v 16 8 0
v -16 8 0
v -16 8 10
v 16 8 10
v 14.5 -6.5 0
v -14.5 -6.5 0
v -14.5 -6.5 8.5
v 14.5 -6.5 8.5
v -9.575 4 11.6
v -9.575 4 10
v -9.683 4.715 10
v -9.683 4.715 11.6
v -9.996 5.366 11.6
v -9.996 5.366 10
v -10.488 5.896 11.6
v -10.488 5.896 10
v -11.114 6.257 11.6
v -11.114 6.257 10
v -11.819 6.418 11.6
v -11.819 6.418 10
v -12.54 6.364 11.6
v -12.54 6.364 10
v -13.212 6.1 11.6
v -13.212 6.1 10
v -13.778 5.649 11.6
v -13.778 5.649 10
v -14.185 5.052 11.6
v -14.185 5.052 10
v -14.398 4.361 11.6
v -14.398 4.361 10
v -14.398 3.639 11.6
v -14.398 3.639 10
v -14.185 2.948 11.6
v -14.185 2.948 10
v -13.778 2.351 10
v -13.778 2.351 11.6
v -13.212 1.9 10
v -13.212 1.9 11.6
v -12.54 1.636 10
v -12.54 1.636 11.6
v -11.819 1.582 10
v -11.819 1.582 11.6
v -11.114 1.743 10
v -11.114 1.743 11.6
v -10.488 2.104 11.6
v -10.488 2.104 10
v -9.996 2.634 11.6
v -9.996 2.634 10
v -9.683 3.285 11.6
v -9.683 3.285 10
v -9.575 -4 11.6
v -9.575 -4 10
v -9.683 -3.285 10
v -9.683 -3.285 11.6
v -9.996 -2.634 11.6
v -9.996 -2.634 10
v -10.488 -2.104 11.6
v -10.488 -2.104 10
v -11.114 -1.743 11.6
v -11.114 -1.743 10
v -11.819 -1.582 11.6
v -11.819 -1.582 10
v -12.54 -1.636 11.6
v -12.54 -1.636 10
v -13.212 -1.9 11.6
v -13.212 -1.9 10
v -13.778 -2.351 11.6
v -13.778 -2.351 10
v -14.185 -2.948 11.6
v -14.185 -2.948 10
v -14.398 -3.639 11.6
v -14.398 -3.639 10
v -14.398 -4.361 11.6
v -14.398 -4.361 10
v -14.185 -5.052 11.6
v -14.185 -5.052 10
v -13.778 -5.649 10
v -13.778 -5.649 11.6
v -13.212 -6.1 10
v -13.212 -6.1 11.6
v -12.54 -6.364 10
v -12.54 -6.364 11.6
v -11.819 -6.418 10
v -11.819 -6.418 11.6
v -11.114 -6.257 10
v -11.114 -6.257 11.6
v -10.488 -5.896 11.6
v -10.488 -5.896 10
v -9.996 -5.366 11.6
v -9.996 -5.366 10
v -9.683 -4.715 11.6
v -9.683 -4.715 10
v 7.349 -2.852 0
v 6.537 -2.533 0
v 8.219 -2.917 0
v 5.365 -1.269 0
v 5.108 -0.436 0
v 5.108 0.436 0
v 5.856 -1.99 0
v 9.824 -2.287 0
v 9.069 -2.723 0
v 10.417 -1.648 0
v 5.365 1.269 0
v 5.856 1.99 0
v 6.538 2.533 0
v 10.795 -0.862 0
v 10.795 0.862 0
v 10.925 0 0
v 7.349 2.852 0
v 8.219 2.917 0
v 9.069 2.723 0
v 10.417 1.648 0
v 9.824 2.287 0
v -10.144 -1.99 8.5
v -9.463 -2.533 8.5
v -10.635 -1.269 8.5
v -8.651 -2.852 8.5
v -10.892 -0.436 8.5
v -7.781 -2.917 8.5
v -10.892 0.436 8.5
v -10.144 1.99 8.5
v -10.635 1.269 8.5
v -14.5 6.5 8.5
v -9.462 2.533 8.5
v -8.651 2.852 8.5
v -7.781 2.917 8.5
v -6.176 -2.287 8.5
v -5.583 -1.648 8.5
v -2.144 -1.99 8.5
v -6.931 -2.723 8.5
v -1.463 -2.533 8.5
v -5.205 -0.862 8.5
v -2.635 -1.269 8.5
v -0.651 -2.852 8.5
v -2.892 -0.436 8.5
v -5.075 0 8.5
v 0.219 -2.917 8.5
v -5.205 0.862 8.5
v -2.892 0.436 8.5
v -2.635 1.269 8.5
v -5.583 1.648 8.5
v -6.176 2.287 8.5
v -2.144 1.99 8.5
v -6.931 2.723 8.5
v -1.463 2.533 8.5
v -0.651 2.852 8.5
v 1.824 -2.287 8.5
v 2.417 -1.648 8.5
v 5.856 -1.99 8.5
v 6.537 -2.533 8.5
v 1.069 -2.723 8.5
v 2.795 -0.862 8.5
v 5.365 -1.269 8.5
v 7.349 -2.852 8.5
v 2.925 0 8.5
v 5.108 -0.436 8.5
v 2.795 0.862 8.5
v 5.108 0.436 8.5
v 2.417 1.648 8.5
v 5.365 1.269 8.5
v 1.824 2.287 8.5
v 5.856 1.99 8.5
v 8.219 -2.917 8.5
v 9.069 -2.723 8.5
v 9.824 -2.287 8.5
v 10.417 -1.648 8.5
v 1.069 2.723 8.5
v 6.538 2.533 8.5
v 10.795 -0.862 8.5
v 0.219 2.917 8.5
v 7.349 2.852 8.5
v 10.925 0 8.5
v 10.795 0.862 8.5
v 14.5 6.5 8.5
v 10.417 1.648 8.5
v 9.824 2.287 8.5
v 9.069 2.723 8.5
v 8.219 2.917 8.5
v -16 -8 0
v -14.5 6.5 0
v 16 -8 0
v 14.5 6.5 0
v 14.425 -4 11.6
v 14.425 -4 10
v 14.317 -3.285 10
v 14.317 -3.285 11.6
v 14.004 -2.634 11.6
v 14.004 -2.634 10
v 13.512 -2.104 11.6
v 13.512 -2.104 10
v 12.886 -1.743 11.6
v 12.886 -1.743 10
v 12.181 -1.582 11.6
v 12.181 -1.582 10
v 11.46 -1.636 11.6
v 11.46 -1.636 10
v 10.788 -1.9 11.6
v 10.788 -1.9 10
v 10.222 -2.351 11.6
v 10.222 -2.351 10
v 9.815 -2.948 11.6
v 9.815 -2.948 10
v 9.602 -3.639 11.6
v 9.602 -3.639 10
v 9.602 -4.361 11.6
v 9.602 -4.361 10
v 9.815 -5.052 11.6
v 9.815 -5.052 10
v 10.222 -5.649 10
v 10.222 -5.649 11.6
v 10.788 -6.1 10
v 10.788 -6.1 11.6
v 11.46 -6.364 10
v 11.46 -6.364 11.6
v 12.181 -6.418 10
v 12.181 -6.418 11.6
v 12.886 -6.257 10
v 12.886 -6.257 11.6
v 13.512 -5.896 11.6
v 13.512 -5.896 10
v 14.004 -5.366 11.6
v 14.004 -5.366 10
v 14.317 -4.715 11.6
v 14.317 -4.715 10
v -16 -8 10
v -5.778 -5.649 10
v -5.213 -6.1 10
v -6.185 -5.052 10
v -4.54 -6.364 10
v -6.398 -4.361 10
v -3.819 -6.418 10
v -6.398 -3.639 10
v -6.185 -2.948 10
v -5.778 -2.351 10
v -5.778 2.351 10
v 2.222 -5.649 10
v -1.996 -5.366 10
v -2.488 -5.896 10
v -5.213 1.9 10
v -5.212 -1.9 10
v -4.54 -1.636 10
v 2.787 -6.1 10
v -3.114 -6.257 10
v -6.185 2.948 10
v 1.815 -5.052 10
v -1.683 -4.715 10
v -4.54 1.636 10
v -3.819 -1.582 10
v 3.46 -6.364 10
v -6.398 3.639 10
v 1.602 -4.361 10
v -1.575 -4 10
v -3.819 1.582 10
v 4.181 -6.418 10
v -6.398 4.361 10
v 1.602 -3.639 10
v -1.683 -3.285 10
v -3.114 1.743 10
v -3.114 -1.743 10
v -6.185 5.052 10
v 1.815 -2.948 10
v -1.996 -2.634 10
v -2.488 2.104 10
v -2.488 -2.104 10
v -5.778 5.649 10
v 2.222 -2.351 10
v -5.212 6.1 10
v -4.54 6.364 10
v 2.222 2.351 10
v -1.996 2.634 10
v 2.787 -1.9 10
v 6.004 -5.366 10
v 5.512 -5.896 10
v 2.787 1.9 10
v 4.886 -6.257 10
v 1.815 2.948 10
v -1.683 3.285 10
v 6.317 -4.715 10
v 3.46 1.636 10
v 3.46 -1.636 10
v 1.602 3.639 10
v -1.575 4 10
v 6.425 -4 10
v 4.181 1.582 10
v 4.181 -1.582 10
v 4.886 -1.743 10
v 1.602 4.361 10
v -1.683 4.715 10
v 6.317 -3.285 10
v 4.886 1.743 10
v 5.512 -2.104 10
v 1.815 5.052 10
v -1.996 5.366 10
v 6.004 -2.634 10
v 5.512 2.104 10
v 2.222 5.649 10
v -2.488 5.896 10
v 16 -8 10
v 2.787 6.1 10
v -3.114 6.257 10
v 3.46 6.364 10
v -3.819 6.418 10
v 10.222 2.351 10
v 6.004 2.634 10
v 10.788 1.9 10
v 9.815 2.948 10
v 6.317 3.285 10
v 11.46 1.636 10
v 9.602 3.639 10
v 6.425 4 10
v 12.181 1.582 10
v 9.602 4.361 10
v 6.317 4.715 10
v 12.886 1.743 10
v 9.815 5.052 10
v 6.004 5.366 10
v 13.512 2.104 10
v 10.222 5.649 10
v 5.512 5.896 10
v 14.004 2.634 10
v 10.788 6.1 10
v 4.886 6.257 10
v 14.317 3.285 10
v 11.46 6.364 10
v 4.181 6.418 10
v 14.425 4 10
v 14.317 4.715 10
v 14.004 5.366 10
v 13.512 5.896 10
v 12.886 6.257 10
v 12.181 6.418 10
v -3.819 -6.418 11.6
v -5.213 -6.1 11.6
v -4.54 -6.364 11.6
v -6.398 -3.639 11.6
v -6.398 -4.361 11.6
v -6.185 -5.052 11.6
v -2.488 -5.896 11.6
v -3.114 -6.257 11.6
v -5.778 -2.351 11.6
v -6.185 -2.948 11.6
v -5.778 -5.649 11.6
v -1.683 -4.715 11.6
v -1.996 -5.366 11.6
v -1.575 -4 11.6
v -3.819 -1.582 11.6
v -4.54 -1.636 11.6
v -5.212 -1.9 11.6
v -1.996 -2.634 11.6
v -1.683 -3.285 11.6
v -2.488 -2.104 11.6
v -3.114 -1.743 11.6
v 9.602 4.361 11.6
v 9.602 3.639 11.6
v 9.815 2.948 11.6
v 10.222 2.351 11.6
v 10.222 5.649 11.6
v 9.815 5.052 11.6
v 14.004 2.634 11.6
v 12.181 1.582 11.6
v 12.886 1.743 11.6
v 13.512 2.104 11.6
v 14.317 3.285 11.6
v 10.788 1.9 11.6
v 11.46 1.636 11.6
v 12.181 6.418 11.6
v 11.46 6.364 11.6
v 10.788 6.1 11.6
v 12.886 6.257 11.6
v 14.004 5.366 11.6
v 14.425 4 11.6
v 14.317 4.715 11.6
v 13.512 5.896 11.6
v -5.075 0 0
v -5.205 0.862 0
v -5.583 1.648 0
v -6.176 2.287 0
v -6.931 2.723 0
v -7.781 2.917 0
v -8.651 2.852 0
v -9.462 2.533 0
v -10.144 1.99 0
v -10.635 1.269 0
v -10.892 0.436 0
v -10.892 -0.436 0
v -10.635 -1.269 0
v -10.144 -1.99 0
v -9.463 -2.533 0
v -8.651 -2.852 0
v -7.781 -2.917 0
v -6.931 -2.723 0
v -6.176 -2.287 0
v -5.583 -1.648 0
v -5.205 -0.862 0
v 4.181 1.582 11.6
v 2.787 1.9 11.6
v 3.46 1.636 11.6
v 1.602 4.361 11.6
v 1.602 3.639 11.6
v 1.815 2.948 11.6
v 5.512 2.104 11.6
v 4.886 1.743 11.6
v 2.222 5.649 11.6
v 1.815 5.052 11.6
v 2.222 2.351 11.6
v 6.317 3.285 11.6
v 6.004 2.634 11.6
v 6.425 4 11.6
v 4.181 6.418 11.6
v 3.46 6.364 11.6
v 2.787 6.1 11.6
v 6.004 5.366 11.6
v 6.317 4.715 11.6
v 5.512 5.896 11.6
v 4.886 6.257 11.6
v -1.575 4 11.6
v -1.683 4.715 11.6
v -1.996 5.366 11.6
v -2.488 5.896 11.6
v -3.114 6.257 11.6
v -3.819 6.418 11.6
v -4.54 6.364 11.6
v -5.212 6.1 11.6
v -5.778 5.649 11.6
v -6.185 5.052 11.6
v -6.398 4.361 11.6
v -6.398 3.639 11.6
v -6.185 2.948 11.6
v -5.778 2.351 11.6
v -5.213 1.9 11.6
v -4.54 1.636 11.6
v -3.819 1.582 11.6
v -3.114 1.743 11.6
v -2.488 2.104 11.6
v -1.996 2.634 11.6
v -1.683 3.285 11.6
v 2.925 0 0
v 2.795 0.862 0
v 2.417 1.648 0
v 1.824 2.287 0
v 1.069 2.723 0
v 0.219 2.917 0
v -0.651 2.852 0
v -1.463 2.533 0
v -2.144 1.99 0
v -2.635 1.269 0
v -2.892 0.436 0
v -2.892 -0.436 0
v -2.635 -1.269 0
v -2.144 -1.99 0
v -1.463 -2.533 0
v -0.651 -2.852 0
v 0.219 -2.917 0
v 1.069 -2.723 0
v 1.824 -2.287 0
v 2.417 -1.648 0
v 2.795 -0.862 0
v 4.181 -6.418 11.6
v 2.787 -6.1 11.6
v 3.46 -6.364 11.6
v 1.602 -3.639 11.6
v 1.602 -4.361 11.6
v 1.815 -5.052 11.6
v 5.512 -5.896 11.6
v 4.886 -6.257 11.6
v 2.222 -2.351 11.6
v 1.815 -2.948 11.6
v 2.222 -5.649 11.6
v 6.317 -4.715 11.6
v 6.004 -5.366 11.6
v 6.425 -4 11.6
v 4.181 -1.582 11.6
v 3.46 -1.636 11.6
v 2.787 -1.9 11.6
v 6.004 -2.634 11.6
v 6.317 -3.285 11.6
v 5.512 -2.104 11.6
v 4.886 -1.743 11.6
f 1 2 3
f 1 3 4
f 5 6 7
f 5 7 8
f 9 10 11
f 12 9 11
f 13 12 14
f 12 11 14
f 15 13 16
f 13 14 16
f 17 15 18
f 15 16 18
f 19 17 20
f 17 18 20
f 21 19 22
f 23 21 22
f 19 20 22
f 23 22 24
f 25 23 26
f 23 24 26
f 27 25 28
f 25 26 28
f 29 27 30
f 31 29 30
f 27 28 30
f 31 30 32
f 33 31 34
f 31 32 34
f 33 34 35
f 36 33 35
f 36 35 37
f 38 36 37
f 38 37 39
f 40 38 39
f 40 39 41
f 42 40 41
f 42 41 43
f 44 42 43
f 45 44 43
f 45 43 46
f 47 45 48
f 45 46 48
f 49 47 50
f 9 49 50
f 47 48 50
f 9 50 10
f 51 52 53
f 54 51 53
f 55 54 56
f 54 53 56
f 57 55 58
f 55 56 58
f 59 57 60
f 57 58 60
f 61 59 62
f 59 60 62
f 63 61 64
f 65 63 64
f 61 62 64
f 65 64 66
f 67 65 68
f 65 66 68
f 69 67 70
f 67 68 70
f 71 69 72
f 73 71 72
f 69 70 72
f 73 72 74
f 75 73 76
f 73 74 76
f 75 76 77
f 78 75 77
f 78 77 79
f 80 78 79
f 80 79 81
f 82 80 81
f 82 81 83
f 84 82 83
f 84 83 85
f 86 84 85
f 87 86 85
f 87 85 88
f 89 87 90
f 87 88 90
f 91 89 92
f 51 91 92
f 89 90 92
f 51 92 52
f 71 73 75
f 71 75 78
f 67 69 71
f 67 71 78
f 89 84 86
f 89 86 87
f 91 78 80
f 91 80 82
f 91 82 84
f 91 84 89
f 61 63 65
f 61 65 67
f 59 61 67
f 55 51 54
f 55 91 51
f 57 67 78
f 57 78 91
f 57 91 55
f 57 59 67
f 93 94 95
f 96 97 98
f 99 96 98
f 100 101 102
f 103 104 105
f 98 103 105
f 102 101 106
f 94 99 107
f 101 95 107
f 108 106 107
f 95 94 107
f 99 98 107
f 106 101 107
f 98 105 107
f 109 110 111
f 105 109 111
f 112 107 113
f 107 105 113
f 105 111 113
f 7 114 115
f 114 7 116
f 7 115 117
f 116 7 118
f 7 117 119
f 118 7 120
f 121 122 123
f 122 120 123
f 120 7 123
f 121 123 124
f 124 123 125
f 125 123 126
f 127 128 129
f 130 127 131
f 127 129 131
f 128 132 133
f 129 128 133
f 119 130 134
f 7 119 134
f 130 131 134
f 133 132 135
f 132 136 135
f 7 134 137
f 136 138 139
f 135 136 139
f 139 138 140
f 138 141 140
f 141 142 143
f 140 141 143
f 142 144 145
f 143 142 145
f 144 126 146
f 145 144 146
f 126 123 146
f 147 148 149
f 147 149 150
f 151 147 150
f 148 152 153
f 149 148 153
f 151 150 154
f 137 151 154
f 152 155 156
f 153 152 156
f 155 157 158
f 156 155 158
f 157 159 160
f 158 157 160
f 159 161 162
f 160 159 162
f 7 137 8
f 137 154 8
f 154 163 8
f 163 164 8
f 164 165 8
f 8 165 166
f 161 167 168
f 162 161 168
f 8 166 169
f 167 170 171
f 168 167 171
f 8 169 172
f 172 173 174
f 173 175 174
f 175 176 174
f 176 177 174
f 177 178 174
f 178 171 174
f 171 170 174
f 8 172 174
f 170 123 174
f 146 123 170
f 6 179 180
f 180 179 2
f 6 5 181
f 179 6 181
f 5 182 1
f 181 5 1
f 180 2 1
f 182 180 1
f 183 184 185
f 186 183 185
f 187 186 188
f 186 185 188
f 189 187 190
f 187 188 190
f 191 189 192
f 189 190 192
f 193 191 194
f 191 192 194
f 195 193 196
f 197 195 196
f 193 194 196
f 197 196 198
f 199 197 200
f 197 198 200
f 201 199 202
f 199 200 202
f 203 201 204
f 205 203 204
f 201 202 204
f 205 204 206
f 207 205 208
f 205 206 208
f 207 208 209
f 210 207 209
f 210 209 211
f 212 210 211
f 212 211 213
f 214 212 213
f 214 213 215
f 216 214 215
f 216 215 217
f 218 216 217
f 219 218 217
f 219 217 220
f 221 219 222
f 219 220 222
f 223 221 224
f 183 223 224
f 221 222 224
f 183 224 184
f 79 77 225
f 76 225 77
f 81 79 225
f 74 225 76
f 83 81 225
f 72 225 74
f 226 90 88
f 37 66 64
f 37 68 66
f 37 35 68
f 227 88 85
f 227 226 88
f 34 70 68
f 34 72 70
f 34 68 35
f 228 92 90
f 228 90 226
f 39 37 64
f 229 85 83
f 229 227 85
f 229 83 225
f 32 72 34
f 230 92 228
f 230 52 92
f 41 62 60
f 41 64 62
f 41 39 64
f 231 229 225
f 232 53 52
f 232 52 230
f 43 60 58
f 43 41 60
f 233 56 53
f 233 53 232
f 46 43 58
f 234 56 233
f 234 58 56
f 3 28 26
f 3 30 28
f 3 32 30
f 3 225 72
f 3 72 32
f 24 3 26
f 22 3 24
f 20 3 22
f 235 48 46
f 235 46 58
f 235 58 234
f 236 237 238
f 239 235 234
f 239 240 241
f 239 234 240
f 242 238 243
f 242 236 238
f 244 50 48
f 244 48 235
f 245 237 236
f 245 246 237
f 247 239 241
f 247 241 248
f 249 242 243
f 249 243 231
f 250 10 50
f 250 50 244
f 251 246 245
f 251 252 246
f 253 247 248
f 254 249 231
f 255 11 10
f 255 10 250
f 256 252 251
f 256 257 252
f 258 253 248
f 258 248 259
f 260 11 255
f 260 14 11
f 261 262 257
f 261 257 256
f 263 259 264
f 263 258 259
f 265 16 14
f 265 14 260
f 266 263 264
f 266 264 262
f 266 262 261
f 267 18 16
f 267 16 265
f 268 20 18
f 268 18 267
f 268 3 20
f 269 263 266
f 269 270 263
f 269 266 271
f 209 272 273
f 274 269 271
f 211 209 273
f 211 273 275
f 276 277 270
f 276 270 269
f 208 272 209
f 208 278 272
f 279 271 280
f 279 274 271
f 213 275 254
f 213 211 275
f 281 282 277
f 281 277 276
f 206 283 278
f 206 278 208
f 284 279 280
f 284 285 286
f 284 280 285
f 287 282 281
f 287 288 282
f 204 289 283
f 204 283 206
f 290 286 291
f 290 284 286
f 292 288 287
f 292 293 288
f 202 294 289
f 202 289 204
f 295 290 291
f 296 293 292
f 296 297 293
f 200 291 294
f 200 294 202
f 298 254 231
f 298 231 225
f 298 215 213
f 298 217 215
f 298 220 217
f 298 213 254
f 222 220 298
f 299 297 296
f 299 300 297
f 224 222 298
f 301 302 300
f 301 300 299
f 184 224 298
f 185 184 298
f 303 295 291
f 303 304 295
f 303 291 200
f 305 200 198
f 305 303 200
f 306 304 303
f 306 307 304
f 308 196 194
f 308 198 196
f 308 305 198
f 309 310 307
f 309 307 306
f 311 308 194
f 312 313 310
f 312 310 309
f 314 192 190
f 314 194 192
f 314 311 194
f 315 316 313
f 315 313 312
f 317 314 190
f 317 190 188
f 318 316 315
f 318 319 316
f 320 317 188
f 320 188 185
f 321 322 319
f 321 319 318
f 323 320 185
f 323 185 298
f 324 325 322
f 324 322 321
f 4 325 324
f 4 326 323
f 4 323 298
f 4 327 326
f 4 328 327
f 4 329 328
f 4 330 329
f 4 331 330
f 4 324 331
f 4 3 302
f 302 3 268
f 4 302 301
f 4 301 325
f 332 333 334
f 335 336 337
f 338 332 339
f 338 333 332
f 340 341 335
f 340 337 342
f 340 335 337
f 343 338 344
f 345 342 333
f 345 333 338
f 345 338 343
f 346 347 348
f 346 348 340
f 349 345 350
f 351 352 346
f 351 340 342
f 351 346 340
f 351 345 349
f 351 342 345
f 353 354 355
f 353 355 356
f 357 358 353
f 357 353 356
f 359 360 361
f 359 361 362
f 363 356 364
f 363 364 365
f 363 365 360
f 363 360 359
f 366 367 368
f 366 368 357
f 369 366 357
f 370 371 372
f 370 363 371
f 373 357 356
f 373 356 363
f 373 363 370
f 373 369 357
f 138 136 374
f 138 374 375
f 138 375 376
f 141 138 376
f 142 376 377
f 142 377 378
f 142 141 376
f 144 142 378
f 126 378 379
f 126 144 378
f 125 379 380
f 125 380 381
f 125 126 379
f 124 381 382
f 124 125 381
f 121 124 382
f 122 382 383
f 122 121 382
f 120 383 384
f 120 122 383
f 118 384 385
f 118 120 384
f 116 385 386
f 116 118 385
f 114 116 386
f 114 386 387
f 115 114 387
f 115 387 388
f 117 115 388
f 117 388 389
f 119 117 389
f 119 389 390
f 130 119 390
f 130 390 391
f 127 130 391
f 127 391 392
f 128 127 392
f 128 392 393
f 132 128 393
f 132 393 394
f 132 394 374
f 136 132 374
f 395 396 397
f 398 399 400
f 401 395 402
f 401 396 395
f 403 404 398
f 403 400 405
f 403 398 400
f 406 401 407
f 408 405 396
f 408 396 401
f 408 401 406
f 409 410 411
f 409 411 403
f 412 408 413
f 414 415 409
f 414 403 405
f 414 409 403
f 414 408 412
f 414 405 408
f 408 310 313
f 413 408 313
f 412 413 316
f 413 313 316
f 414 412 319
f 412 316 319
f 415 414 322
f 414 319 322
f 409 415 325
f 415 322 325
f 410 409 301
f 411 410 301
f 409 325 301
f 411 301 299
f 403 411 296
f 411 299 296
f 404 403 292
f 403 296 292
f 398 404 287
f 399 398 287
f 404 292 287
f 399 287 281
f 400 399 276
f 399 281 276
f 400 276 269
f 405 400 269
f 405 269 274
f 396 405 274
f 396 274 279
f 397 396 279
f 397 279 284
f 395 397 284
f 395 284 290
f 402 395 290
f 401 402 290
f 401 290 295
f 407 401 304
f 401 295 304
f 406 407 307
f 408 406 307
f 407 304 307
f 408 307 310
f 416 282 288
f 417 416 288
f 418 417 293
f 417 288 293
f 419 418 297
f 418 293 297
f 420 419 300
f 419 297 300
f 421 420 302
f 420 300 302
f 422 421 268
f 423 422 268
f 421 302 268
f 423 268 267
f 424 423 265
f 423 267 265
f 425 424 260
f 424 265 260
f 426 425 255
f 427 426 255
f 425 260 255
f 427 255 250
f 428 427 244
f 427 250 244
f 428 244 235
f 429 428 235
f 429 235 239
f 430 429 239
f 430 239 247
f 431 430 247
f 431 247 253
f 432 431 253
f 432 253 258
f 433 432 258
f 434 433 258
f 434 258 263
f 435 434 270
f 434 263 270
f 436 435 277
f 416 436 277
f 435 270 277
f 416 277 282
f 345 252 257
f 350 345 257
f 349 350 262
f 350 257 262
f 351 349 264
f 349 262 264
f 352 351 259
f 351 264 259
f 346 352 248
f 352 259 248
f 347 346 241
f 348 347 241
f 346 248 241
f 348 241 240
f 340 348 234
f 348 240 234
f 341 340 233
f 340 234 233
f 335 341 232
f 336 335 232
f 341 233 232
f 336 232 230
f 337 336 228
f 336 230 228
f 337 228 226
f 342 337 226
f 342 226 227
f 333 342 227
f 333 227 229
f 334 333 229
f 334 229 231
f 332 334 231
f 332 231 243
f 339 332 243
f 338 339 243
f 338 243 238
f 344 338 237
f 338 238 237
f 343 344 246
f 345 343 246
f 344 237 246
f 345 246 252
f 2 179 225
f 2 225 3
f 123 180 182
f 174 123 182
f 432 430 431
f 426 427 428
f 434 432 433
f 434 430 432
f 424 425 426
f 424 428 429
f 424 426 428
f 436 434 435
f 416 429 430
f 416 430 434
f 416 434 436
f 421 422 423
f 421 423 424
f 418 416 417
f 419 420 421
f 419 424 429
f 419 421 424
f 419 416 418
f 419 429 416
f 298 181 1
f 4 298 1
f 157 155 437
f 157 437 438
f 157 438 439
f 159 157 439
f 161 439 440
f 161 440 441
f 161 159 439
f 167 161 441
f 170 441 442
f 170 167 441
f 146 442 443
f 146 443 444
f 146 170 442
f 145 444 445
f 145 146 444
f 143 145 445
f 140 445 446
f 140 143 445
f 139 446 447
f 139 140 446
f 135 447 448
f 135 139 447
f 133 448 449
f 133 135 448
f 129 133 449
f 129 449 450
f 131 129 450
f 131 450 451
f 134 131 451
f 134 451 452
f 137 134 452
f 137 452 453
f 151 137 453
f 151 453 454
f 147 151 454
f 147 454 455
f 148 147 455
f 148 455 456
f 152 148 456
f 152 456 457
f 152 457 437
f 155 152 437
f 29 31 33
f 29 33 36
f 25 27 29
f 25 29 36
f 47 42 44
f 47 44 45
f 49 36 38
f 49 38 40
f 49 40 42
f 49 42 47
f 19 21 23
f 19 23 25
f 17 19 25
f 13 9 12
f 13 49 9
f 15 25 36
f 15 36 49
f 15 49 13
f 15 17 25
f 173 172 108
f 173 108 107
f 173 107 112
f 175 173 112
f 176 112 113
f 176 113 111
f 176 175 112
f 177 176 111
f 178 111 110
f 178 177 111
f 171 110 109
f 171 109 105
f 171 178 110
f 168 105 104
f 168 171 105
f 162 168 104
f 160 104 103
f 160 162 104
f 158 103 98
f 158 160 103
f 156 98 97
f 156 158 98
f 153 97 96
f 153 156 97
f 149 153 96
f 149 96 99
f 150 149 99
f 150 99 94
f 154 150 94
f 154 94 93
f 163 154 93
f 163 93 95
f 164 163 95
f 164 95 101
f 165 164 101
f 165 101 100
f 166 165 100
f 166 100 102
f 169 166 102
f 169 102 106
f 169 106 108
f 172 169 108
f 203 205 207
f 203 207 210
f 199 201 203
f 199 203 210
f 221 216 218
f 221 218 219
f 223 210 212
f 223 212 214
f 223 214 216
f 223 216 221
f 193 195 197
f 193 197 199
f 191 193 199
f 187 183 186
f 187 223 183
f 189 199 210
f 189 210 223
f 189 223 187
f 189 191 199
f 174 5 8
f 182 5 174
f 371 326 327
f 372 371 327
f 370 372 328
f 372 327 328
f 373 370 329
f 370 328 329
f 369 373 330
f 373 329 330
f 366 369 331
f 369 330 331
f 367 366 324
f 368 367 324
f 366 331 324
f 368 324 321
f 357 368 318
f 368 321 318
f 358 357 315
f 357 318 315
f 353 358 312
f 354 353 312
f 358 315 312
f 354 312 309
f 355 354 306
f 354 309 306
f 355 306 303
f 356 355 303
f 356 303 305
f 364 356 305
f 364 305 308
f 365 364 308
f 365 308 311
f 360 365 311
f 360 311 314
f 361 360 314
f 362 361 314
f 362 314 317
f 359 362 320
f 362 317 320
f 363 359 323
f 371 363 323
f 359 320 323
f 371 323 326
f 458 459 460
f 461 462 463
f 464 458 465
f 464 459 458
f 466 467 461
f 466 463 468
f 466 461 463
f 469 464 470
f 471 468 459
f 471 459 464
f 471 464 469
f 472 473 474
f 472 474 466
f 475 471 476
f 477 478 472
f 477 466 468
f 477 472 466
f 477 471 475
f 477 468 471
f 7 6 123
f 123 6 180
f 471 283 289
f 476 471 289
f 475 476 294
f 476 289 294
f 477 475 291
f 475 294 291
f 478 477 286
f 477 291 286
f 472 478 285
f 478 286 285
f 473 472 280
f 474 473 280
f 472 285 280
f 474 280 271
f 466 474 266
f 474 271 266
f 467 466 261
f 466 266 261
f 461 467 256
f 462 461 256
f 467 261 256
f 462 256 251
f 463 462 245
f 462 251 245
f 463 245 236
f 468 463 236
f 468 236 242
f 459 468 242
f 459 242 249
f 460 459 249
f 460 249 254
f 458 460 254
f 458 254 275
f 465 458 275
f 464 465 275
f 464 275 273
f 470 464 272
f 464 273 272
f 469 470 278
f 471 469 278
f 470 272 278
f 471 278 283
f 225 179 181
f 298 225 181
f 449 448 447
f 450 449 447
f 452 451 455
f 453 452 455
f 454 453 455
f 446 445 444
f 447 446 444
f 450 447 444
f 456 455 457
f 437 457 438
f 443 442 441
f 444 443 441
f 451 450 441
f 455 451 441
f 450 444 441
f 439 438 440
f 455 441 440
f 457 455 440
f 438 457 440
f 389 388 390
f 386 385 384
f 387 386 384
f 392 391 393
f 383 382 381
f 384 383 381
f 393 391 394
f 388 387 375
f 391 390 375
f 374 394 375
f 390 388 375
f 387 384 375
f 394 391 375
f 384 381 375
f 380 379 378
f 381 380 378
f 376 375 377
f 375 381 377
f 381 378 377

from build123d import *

# Parameters (mm, degrees)
F0_W     = 32
F0_H     = 16
F1_DEPTH = 10
F2_T     = -1.5
F3_R     = 2.425
F4_DEPTH = 1.6
F5_R     = 2.925
F6_DEPTH = 10


with BuildPart() as f1:
    # F0 (on Top) → F1 (new body)
    with BuildSketch(Plane.XY):
        Rectangle(F0_W, F0_H)
    extrude(amount=F1_DEPTH)

    # F2
    f2_openings = [f1.faces().sort_by_distance(p)[0] for p in [
        (0, 0, 0),
    ]]
    offset(amount=F2_T, openings=f2_openings)

    # F3 (on face) → F4 (join)
    with BuildSketch(Plane.XY.offset(10)):
        with Locations((-12, -4)):
            Circle(F3_R)
        with Locations((-12, 4)):
            Circle(F3_R)
        with Locations((-4, -4)):
            Circle(F3_R)
        with Locations((-4, 4)):
            Circle(F3_R)
        with Locations((4, -4)):
            Circle(F3_R)
        with Locations((4, 4)):
            Circle(F3_R)
        with Locations((12, -4)):
            Circle(F3_R)
        with Locations((12, 4)):
            Circle(F3_R)
    extrude(amount=F4_DEPTH)

    # F5 (on face) → F6 (join)
    with BuildSketch(Plane.XY.offset(10)):
        with Locations((-8, 0)):
            Circle(F5_R)
        Circle(F5_R)
        with Locations((8, 0)):
            Circle(F5_R)
    extrude(amount=-F6_DEPTH)


solid = f1.part
